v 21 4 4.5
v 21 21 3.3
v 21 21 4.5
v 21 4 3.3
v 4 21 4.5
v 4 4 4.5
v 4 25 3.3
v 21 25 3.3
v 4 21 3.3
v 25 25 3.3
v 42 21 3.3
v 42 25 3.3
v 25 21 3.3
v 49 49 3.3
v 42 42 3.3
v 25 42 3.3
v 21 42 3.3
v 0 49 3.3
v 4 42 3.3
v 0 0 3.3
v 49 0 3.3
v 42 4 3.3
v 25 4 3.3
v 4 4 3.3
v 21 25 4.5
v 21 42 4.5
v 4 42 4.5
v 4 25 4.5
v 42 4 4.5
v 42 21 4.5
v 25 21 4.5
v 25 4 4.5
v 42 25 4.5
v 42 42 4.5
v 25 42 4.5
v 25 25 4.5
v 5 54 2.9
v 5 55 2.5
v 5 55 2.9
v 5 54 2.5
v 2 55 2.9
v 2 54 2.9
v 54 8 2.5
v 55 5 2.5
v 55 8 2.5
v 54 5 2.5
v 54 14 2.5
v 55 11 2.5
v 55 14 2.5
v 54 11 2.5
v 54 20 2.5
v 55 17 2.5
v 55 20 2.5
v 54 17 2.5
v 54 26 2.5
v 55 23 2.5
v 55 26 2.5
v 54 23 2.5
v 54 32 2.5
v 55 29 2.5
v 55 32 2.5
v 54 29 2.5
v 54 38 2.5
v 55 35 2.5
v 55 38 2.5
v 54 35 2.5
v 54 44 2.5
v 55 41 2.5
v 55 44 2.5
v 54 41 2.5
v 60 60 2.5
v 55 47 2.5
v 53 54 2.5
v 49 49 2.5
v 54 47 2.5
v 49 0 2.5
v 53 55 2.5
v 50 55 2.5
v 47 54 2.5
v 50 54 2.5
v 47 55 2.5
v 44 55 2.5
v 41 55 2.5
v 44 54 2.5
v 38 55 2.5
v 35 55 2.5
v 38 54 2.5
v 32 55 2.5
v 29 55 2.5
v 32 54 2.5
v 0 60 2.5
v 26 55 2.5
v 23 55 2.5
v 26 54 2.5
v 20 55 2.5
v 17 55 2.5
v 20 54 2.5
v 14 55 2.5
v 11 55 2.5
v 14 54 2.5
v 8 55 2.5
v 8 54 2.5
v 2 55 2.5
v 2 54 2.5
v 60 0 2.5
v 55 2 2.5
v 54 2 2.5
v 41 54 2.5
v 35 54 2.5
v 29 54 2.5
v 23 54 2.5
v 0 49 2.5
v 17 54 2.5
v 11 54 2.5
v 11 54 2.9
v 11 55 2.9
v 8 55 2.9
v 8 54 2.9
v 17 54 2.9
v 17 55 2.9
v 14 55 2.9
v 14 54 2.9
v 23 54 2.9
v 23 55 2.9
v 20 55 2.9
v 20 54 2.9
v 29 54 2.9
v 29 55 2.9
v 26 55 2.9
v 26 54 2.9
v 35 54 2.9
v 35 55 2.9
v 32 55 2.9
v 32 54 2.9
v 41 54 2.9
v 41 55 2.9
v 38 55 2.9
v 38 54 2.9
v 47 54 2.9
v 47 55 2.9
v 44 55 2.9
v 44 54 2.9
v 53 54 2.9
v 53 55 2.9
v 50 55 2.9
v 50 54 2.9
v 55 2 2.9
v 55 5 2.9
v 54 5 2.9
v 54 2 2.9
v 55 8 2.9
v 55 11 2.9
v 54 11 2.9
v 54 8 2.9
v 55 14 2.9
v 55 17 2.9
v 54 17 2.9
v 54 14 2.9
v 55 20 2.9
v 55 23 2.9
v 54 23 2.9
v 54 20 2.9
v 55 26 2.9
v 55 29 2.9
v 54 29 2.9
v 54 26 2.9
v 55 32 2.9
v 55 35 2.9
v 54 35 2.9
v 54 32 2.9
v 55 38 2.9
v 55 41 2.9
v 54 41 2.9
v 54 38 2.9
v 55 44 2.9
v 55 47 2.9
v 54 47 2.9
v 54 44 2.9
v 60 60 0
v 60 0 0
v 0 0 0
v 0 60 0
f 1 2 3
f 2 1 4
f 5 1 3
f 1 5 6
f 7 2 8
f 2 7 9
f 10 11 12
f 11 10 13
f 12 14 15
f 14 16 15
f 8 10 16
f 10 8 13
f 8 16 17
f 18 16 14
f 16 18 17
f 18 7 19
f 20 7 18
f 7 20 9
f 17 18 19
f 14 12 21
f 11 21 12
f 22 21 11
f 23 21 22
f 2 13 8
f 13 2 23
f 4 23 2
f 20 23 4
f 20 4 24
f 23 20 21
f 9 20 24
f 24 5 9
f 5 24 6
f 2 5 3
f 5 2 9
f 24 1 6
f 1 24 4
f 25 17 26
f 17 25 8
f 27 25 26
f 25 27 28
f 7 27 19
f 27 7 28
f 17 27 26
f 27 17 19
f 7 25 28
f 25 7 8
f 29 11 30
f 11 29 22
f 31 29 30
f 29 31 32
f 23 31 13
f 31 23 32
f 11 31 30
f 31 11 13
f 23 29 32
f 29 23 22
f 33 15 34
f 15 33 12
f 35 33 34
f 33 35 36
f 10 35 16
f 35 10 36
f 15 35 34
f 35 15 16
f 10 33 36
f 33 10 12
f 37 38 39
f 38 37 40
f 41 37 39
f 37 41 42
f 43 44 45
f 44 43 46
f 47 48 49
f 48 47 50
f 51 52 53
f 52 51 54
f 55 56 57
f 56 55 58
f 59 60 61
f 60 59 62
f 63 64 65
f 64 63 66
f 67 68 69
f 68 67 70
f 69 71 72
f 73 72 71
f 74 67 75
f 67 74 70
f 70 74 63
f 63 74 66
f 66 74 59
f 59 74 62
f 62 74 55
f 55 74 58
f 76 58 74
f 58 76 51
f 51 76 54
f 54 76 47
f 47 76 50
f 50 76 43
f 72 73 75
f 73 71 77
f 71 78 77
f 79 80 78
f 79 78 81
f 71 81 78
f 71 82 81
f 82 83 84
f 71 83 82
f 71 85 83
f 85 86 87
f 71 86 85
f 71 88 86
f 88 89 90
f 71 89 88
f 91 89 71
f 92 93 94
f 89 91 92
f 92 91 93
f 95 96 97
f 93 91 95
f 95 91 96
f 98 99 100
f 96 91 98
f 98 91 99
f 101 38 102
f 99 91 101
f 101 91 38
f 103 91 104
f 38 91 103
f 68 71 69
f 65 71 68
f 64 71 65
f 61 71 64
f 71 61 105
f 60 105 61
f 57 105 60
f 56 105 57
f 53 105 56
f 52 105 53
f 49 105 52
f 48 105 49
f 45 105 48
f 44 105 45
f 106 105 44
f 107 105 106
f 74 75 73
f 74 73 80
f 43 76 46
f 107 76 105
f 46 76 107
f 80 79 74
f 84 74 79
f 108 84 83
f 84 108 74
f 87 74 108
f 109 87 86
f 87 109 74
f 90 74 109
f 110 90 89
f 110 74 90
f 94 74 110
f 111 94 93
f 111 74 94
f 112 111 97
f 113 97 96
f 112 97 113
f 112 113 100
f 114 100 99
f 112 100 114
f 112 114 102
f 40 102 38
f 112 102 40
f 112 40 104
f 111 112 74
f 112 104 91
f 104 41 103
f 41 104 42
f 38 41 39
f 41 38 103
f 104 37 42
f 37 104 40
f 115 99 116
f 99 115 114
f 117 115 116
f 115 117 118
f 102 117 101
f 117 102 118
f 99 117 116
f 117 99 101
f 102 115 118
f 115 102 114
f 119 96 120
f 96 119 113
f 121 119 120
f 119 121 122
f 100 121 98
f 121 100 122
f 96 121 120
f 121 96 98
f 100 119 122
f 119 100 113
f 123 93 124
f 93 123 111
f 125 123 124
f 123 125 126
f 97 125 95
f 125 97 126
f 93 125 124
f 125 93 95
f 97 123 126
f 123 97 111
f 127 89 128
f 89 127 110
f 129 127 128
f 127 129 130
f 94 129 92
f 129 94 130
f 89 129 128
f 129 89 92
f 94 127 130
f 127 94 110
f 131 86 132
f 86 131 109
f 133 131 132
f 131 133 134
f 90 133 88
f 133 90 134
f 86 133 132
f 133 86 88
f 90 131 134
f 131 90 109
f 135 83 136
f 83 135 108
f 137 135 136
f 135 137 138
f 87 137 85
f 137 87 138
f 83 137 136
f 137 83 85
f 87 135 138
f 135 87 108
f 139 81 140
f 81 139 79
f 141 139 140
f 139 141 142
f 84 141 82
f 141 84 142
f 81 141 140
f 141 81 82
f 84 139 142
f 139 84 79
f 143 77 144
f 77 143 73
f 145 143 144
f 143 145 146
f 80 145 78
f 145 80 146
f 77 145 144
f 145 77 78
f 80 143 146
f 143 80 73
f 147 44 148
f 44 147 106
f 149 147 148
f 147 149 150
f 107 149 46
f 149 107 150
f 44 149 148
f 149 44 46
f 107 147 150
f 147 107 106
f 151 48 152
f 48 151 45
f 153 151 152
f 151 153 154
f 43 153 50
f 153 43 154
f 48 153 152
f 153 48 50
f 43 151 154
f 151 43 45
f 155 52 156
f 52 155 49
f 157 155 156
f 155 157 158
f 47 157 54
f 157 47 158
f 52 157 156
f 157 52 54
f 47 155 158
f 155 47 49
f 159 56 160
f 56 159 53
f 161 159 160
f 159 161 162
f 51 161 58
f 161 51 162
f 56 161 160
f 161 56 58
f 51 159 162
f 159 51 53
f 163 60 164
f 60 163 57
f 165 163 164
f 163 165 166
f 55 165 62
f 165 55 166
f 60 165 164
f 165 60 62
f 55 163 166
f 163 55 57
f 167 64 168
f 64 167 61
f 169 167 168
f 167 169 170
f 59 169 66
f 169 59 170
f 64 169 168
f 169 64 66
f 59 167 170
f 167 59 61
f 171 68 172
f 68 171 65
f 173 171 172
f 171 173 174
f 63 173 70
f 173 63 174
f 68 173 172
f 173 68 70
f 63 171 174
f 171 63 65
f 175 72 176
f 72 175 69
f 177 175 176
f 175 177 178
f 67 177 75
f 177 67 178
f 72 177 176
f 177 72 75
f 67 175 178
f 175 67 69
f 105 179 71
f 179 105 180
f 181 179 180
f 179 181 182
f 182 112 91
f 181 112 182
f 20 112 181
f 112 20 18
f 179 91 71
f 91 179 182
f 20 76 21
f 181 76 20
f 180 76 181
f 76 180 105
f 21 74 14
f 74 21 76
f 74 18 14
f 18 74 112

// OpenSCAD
// ============================================================
// CITY TILE — design a district as a SYSTEM
// ============================================================
// One tile = one city block with streets on two sides. Print
// lots of them and they line up into a growing district — the
// same idea as GreebleCity and miniCITIES, but this one is YOURS.
//
// The system rule that makes tiles compatible:
//   * every tile is `tile` mm square
//   * roads always run along the +X and +Y edges, `road_w` wide
// Any tile that follows the rule connects to any other. That's
// how modular city kits work.
//
// Print: flat, no supports, ~30-45 min per tile.
// Multi-color: paint the road, sidewalk, and grass different
// colors in Bambu Studio — they're at different heights, so
// the height-range painting tool does it in seconds.
// ============================================================

// ------------ CHANGE THESE ------------
tile        = 60;    // tile edge length (keep the same for ALL tiles!)
road_w      = 11;    // road width along two edges (same for all tiles!)
sidewalk_w  = 3;     // sidewalk strip beside the road
base_h      = 2.5;   // tile thickness (road surface height)
sidewalk_h  = 0.8;   // sidewalks sit this much above the road
pads        = 2;     // building pads per row (pads x pads grid): 1, 2 or 3
pad_h       = 1.2;   // building pad height above the block
with_dashes = true;  // dashed center line on the roads
// ---------------------------------------

block = tile - road_w - sidewalk_w;   // the buildable part

$fn = 48;

// ---- base: the whole tile at road height ----
cube([tile, tile, base_h]);

// ---- the city block: everything that isn't road ----
// (sits at sidewalk height; roads stay recessed along +X/+Y edges)
translate([0, 0, base_h])
    cube([block + sidewalk_w, block + sidewalk_w, sidewalk_h]);

// ---- building pads: raised plinths you design buildings for ----
pad_gap  = 4;
pad_size = (block - pad_gap * (pads + 1)) / pads;
for (ix = [0 : pads - 1])
    for (iy = [0 : pads - 1])
        translate([pad_gap + ix * (pad_size + pad_gap),
                   pad_gap + iy * (pad_size + pad_gap),
                   base_h + sidewalk_h])
            cube([pad_size, pad_size, pad_h]);

// ---- dashed center lines on the roads (paintable lane marks) ----
if (with_dashes) {
    dash = 3;
    for (x = [2 : dash * 2 : tile - dash - 2])
        translate([x, tile - road_w/2 - 0.5, base_h])
            cube([dash, 1, 0.4]);
    for (y = [2 : dash * 2 : tile - road_w - dash - 2])
        translate([tile - road_w/2 - 0.5, y, base_h])
            cube([1, dash, 0.4]);
}

// IDEAS TO TRY (or ask Claude):
//  - a park tile: no pads, add trees (cylinder trunk + sphere top)
//  - a plaza tile with a fountain in the middle
//  - a transit tile: recess a train trench diagonally through it
//  - buildings that FIT the pads: design them in
//    parametric-building.scad with bldg_w = pad_size
//  - a corner tile / T-junction: move the roads to different edges
//    (keep the tile size the same so it still connects!)
